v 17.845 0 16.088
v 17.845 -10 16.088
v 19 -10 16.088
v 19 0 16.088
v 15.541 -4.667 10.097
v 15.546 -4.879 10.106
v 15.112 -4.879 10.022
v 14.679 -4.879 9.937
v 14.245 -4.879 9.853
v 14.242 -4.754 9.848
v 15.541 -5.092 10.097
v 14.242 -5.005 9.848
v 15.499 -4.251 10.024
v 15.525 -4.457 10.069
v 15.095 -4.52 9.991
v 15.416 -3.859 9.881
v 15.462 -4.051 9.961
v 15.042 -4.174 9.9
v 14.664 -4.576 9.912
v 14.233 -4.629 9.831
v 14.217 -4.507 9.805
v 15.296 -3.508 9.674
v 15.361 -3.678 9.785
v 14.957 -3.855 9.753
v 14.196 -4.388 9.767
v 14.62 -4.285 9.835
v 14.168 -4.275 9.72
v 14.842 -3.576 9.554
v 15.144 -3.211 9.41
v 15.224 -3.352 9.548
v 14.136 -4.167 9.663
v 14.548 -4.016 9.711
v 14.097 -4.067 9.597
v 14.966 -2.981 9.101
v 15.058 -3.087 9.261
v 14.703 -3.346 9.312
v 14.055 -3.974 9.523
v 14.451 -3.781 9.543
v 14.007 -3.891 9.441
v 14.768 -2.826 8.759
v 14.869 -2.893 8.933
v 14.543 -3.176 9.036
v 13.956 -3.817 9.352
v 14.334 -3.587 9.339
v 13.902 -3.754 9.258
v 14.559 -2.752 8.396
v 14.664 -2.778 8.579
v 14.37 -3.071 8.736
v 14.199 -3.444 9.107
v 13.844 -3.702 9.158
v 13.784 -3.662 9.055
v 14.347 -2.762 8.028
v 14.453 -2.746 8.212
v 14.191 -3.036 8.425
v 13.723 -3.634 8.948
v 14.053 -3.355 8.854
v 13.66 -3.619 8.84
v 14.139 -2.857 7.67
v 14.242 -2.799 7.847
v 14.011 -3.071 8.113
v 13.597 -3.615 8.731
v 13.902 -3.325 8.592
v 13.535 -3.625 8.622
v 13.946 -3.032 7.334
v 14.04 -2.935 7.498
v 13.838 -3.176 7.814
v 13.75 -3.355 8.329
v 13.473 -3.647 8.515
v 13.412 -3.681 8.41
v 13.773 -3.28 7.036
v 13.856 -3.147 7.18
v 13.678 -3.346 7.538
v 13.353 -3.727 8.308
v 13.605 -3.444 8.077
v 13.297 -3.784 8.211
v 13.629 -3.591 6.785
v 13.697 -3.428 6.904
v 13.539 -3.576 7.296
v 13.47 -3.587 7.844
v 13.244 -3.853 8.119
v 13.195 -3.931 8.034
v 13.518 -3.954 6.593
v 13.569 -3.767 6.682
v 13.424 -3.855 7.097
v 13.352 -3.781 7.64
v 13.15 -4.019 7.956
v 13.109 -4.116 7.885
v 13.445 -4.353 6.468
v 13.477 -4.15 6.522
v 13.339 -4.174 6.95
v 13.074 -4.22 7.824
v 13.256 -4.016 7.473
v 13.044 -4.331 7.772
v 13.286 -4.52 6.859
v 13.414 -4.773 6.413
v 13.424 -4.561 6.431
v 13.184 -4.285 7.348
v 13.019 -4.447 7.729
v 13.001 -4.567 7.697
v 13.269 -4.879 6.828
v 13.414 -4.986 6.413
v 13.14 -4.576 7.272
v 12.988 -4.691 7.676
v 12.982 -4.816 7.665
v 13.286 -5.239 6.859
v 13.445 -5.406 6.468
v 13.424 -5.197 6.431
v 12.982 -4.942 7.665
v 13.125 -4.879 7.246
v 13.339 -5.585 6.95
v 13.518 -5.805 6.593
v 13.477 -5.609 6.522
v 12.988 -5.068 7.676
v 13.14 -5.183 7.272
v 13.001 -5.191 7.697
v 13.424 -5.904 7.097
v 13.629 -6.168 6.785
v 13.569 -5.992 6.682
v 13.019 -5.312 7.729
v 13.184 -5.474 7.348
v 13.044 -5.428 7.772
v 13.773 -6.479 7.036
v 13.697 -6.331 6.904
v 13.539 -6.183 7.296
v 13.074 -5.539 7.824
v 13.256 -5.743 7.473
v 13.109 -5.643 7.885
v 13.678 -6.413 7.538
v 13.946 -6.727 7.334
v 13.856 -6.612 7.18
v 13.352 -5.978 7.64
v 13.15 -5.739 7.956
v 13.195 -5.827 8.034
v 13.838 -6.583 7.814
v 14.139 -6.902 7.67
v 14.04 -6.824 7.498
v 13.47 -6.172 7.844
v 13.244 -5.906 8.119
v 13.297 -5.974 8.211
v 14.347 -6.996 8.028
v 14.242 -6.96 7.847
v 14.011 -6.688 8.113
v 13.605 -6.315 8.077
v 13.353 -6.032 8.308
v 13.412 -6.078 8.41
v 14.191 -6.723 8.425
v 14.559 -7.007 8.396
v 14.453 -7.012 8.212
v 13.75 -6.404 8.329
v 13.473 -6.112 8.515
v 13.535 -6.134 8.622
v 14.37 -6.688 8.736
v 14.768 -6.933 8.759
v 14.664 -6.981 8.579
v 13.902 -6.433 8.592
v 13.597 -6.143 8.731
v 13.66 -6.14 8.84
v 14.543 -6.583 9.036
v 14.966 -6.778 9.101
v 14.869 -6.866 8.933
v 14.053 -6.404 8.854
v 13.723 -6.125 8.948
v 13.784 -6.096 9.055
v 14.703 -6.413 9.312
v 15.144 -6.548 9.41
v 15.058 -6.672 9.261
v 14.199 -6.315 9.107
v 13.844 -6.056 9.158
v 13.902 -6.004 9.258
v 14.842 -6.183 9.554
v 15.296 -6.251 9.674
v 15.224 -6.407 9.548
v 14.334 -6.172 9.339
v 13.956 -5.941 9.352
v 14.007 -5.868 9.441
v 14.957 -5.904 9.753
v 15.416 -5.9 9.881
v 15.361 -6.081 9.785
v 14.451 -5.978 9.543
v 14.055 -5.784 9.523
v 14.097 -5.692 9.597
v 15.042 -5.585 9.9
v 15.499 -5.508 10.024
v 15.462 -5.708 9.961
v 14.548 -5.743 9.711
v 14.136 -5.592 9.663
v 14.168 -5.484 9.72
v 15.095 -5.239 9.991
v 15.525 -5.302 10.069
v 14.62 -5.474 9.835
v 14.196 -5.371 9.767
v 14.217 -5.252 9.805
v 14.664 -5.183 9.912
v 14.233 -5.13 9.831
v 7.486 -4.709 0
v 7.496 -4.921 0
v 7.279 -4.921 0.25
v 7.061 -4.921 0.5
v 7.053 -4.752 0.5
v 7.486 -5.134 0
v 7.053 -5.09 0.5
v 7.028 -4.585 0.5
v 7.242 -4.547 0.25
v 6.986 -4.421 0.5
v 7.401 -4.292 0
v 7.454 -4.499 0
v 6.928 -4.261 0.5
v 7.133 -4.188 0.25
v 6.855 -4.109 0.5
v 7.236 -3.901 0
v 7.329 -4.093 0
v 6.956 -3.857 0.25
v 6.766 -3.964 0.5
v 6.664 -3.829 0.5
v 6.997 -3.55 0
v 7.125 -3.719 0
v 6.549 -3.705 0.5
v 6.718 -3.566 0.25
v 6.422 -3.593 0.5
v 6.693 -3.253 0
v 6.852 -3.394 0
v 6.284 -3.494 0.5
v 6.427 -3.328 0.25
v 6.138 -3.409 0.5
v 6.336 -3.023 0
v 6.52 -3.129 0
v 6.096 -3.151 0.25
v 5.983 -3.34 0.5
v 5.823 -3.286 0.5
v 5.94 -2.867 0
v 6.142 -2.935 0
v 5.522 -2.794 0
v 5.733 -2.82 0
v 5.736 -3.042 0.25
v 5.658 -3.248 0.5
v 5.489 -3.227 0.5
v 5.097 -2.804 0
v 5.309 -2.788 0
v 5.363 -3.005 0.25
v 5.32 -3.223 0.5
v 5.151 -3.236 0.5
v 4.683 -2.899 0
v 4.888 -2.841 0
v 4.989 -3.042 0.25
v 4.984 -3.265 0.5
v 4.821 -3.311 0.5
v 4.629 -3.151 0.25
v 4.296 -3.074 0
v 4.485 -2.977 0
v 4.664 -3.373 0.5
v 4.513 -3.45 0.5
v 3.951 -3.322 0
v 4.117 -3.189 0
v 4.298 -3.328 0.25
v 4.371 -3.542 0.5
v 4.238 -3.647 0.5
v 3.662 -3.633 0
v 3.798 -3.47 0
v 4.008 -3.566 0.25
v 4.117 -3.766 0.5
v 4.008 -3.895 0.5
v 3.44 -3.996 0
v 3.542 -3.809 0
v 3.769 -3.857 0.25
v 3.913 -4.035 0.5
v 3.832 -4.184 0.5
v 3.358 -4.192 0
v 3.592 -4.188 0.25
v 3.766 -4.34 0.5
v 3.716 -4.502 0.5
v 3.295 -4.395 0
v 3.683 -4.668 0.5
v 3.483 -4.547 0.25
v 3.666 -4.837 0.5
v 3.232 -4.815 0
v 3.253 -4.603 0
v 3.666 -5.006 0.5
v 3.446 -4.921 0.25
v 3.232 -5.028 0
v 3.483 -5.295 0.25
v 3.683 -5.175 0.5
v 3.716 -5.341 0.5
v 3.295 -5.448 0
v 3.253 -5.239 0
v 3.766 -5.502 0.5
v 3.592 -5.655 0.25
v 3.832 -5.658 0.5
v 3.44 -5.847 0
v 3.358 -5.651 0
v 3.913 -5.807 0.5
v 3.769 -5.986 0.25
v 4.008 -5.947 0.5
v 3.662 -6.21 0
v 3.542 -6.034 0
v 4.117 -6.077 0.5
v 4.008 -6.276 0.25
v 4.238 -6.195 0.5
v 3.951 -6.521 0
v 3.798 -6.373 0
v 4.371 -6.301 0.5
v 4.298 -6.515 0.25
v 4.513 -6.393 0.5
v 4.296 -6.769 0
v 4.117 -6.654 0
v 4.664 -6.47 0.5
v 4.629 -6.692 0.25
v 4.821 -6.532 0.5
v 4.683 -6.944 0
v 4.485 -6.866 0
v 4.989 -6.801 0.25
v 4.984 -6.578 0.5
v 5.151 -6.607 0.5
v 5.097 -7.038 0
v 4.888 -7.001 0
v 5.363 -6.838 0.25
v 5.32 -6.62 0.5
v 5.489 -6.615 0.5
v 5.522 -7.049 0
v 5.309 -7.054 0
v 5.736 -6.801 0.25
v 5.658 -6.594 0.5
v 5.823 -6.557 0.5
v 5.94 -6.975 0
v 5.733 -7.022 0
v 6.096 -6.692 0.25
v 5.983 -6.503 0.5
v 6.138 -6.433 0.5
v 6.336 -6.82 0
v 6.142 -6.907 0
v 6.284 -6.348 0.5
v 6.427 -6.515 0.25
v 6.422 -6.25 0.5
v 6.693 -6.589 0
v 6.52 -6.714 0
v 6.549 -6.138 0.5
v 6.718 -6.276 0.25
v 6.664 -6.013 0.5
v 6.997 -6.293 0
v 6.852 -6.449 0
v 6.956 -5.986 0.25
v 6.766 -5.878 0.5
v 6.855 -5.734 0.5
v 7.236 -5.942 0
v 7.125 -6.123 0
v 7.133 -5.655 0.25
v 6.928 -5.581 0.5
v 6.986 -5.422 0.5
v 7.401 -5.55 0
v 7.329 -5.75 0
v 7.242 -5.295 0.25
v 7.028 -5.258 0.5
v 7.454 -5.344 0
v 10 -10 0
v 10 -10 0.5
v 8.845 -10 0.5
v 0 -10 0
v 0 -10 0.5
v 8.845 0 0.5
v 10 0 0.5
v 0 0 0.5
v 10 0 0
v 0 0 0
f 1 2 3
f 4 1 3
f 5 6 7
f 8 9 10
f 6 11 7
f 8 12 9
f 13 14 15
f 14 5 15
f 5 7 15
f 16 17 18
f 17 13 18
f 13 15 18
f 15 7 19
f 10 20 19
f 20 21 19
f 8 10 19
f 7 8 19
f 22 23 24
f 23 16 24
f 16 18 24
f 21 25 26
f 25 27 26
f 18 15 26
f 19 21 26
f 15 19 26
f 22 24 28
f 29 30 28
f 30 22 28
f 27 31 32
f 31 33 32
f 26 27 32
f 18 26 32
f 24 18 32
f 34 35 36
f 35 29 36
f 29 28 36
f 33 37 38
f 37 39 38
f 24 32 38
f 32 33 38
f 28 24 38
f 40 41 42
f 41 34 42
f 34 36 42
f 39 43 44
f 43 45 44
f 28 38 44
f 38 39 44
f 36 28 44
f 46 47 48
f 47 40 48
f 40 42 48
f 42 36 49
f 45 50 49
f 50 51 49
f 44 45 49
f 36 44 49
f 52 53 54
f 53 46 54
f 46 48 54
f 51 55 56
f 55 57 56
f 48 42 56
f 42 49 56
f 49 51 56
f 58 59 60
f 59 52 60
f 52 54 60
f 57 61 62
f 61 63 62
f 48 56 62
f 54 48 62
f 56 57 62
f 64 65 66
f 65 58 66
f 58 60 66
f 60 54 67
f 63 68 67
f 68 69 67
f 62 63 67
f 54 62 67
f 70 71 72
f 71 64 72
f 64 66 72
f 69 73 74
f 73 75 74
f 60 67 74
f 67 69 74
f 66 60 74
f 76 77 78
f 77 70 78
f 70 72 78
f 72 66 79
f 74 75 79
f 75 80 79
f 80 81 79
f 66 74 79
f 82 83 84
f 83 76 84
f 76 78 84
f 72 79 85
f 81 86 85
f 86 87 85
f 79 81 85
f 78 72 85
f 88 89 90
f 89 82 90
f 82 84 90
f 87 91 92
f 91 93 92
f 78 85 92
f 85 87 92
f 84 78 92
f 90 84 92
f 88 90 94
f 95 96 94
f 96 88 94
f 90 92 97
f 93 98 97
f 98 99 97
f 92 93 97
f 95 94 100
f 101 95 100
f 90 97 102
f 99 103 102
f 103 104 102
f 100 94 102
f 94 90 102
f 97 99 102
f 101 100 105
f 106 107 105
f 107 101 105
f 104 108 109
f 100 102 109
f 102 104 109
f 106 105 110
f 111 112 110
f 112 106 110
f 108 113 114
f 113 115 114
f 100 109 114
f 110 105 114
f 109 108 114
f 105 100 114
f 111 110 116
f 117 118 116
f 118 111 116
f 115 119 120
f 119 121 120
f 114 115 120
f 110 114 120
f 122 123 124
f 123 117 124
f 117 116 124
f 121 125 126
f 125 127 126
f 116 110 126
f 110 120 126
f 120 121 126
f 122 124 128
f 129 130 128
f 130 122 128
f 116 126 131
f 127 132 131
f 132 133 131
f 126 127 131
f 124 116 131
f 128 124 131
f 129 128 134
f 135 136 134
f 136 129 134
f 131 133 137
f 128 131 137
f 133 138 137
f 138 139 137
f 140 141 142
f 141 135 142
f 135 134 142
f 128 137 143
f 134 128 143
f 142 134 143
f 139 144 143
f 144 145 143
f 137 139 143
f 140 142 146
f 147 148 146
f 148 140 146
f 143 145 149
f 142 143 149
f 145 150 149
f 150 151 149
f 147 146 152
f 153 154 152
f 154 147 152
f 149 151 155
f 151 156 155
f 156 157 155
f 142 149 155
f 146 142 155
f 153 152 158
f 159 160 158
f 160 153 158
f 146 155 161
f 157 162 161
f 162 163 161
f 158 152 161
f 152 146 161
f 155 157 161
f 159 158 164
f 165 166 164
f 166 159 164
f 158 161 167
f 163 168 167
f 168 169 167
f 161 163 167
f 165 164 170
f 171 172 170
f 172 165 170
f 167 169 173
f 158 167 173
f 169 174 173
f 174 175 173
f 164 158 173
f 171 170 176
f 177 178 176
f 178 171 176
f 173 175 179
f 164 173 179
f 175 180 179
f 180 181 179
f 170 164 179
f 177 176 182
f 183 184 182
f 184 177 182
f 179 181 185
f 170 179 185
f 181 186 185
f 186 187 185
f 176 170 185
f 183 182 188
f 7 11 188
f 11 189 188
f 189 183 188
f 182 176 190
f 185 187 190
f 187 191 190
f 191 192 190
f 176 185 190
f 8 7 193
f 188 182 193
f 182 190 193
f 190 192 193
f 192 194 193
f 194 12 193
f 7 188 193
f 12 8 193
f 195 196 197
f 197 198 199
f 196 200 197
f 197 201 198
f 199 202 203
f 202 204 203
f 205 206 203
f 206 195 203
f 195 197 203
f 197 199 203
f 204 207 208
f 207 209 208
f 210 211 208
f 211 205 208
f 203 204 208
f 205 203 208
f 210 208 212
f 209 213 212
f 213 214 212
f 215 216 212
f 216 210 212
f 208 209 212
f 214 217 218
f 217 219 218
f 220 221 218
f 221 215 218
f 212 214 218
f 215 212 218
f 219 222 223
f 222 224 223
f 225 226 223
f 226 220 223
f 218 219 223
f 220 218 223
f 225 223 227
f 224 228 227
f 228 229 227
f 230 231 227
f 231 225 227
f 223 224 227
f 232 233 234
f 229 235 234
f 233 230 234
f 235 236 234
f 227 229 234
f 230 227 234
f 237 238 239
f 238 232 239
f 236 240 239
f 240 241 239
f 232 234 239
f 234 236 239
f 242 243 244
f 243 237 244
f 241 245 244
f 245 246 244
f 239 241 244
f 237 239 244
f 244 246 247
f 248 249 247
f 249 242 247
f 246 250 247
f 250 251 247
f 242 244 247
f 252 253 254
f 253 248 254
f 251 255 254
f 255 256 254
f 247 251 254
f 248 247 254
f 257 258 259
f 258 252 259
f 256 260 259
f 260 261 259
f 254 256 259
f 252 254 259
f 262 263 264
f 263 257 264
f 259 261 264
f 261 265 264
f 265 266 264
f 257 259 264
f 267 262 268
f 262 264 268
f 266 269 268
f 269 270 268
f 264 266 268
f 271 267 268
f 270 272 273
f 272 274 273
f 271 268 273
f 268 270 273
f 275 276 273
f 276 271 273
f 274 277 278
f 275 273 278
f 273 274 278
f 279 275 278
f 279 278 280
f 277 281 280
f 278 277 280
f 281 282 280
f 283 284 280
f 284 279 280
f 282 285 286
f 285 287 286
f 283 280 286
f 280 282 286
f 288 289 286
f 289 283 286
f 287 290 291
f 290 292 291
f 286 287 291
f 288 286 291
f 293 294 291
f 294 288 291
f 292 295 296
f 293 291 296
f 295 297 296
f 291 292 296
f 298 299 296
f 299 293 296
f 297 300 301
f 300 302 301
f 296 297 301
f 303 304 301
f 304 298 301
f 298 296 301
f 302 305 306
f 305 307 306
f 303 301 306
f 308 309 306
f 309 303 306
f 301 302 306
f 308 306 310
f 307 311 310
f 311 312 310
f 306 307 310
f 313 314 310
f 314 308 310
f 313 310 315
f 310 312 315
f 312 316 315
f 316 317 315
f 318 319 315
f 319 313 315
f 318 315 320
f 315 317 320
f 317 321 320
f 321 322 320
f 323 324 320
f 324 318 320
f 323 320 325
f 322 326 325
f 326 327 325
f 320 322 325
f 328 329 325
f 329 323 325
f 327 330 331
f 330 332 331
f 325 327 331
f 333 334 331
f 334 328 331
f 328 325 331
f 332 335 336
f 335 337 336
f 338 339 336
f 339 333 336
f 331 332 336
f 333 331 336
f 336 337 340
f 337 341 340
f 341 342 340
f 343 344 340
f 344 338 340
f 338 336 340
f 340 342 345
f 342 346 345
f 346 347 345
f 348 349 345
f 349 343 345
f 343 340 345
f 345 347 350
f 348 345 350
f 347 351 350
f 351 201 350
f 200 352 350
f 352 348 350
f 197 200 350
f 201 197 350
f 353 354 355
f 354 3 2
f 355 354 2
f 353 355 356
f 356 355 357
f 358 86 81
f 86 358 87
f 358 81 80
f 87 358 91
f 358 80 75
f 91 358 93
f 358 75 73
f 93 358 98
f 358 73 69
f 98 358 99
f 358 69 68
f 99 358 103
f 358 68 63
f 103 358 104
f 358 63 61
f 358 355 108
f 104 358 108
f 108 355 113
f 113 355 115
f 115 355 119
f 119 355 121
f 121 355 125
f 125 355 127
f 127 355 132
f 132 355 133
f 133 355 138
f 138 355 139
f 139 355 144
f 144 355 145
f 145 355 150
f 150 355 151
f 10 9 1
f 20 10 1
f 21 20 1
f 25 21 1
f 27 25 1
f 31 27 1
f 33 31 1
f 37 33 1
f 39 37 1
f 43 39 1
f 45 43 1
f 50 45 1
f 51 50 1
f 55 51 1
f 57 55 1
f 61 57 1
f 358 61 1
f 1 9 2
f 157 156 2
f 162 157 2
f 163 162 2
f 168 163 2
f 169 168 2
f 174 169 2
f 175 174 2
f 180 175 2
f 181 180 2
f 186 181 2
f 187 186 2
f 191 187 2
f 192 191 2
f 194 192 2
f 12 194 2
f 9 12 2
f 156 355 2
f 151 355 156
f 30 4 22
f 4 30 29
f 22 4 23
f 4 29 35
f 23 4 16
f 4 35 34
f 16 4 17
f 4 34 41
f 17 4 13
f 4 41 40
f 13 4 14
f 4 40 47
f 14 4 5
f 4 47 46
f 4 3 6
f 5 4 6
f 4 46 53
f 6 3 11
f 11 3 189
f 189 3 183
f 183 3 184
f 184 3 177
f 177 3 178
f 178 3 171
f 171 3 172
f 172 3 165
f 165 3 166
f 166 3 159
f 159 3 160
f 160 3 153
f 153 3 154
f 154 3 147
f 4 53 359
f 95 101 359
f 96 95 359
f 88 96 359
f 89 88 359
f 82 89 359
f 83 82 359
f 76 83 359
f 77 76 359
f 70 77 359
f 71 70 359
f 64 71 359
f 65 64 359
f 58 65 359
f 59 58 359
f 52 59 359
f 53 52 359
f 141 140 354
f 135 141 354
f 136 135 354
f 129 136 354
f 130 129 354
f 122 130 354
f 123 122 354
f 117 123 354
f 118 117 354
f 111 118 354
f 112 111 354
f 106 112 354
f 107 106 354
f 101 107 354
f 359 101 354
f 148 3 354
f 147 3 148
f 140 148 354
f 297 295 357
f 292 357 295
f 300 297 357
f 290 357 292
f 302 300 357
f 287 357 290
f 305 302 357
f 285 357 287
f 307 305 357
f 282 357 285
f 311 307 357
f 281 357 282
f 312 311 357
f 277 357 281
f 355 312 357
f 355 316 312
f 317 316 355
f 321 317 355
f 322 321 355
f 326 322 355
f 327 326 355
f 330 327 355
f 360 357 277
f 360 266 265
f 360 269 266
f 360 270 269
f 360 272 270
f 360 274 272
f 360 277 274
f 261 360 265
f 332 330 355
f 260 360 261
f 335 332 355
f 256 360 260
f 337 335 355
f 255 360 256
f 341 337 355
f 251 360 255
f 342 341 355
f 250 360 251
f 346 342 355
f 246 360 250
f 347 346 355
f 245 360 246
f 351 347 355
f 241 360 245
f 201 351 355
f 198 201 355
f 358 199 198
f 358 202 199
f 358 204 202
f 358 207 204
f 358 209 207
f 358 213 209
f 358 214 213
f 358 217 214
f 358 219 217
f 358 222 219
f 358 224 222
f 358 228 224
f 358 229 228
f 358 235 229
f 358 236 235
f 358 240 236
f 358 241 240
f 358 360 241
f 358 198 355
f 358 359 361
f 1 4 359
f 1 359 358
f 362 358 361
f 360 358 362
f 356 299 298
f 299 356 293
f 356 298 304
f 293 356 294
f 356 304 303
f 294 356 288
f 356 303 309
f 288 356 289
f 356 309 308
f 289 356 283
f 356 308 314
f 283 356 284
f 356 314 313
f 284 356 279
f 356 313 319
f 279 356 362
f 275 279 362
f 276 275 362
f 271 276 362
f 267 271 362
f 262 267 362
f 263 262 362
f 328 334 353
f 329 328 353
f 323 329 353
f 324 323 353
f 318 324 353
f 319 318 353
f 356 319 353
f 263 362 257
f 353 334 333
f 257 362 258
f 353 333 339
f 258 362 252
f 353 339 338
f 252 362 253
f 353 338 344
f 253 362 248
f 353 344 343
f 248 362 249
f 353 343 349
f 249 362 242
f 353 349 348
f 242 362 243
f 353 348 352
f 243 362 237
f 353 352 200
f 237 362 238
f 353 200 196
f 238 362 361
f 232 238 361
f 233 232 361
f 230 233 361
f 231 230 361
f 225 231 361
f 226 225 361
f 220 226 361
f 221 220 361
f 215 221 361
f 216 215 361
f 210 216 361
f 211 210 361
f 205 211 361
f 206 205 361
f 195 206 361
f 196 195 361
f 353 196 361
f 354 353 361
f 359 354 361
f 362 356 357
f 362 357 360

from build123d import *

# Parameters (mm, degrees)
SKETCH2_W                                         = 10
SKETCH2_H                                         = 10
BOSS_EXTRUDE1_DEPTH                               = 0.5
BOSS_EXTRUDE2_DEPTH                               = 10
CSK_FOR_1_FLAT_HEAD_SOCKET_CAP_SCREW1_D           = 2.0574
CSK_FOR_1_FLAT_HEAD_SOCKET_CAP_SCREW1_CSINK_D     = 4.2672
CSK_FOR_1_FLAT_HEAD_SOCKET_CAP_SCREW1_CSINK_ANGLE = 82
CSK_FOR_1_FLAT_HEAD_SOCKET_CAP_SCREW2_D           = 2.0574
CSK_FOR_1_FLAT_HEAD_SOCKET_CAP_SCREW2_CSINK_D     = 4.2672
CSK_FOR_1_FLAT_HEAD_SOCKET_CAP_SCREW2_CSINK_ANGLE = 82


with BuildPart() as part:
    # Sketch2 → Boss-Extrude1 (new body)
    with BuildSketch(Plane.XY):
        with Locations((5, -5)):
            Rectangle(SKETCH2_W, SKETCH2_H)
    extrude(amount=BOSS_EXTRUDE1_DEPTH)

    # Sketch3 → Boss-Extrude2 (add)
    with BuildSketch(Plane.XZ.offset(10)):
        Polygon((8.845299462, 0.5), (17.845299462, 16.088457268), (19, 16.088457268), (10, 0.5), align=None)
    extrude(amount=-BOSS_EXTRUDE2_DEPTH)

    # CSK for #1 Flat Head Socket Cap Screw1 (through all)
    with Locations(Plane(origin=(0, 0, 0), x_dir=(-1, 0, 0), z_dir=(0, 0, -1))):
        with Locations((-5.362516401, -4.921292394)):
            CounterSinkHole(CSK_FOR_1_FLAT_HEAD_SOCKET_CAP_SCREW1_D / 2, CSK_FOR_1_FLAT_HEAD_SOCKET_CAP_SCREW1_CSINK_D / 2, counter_sink_angle=CSK_FOR_1_FLAT_HEAD_SOCKET_CAP_SCREW1_CSINK_ANGLE)

    # CSK for #1 Flat Head Socket Cap Screw2 (through all)
    with Locations(Plane(origin=(7.283493649, 0, -4.205127019), x_dir=(-0.5, 0, -0.866025404), z_dir=(0.866025404, 0, -0.5))):
        with Locations((-14.39146791, -4.879407471)):
            CounterSinkHole(CSK_FOR_1_FLAT_HEAD_SOCKET_CAP_SCREW2_D / 2, CSK_FOR_1_FLAT_HEAD_SOCKET_CAP_SCREW2_CSINK_D / 2, counter_sink_angle=CSK_FOR_1_FLAT_HEAD_SOCKET_CAP_SCREW2_CSINK_ANGLE)


solid = part.part
